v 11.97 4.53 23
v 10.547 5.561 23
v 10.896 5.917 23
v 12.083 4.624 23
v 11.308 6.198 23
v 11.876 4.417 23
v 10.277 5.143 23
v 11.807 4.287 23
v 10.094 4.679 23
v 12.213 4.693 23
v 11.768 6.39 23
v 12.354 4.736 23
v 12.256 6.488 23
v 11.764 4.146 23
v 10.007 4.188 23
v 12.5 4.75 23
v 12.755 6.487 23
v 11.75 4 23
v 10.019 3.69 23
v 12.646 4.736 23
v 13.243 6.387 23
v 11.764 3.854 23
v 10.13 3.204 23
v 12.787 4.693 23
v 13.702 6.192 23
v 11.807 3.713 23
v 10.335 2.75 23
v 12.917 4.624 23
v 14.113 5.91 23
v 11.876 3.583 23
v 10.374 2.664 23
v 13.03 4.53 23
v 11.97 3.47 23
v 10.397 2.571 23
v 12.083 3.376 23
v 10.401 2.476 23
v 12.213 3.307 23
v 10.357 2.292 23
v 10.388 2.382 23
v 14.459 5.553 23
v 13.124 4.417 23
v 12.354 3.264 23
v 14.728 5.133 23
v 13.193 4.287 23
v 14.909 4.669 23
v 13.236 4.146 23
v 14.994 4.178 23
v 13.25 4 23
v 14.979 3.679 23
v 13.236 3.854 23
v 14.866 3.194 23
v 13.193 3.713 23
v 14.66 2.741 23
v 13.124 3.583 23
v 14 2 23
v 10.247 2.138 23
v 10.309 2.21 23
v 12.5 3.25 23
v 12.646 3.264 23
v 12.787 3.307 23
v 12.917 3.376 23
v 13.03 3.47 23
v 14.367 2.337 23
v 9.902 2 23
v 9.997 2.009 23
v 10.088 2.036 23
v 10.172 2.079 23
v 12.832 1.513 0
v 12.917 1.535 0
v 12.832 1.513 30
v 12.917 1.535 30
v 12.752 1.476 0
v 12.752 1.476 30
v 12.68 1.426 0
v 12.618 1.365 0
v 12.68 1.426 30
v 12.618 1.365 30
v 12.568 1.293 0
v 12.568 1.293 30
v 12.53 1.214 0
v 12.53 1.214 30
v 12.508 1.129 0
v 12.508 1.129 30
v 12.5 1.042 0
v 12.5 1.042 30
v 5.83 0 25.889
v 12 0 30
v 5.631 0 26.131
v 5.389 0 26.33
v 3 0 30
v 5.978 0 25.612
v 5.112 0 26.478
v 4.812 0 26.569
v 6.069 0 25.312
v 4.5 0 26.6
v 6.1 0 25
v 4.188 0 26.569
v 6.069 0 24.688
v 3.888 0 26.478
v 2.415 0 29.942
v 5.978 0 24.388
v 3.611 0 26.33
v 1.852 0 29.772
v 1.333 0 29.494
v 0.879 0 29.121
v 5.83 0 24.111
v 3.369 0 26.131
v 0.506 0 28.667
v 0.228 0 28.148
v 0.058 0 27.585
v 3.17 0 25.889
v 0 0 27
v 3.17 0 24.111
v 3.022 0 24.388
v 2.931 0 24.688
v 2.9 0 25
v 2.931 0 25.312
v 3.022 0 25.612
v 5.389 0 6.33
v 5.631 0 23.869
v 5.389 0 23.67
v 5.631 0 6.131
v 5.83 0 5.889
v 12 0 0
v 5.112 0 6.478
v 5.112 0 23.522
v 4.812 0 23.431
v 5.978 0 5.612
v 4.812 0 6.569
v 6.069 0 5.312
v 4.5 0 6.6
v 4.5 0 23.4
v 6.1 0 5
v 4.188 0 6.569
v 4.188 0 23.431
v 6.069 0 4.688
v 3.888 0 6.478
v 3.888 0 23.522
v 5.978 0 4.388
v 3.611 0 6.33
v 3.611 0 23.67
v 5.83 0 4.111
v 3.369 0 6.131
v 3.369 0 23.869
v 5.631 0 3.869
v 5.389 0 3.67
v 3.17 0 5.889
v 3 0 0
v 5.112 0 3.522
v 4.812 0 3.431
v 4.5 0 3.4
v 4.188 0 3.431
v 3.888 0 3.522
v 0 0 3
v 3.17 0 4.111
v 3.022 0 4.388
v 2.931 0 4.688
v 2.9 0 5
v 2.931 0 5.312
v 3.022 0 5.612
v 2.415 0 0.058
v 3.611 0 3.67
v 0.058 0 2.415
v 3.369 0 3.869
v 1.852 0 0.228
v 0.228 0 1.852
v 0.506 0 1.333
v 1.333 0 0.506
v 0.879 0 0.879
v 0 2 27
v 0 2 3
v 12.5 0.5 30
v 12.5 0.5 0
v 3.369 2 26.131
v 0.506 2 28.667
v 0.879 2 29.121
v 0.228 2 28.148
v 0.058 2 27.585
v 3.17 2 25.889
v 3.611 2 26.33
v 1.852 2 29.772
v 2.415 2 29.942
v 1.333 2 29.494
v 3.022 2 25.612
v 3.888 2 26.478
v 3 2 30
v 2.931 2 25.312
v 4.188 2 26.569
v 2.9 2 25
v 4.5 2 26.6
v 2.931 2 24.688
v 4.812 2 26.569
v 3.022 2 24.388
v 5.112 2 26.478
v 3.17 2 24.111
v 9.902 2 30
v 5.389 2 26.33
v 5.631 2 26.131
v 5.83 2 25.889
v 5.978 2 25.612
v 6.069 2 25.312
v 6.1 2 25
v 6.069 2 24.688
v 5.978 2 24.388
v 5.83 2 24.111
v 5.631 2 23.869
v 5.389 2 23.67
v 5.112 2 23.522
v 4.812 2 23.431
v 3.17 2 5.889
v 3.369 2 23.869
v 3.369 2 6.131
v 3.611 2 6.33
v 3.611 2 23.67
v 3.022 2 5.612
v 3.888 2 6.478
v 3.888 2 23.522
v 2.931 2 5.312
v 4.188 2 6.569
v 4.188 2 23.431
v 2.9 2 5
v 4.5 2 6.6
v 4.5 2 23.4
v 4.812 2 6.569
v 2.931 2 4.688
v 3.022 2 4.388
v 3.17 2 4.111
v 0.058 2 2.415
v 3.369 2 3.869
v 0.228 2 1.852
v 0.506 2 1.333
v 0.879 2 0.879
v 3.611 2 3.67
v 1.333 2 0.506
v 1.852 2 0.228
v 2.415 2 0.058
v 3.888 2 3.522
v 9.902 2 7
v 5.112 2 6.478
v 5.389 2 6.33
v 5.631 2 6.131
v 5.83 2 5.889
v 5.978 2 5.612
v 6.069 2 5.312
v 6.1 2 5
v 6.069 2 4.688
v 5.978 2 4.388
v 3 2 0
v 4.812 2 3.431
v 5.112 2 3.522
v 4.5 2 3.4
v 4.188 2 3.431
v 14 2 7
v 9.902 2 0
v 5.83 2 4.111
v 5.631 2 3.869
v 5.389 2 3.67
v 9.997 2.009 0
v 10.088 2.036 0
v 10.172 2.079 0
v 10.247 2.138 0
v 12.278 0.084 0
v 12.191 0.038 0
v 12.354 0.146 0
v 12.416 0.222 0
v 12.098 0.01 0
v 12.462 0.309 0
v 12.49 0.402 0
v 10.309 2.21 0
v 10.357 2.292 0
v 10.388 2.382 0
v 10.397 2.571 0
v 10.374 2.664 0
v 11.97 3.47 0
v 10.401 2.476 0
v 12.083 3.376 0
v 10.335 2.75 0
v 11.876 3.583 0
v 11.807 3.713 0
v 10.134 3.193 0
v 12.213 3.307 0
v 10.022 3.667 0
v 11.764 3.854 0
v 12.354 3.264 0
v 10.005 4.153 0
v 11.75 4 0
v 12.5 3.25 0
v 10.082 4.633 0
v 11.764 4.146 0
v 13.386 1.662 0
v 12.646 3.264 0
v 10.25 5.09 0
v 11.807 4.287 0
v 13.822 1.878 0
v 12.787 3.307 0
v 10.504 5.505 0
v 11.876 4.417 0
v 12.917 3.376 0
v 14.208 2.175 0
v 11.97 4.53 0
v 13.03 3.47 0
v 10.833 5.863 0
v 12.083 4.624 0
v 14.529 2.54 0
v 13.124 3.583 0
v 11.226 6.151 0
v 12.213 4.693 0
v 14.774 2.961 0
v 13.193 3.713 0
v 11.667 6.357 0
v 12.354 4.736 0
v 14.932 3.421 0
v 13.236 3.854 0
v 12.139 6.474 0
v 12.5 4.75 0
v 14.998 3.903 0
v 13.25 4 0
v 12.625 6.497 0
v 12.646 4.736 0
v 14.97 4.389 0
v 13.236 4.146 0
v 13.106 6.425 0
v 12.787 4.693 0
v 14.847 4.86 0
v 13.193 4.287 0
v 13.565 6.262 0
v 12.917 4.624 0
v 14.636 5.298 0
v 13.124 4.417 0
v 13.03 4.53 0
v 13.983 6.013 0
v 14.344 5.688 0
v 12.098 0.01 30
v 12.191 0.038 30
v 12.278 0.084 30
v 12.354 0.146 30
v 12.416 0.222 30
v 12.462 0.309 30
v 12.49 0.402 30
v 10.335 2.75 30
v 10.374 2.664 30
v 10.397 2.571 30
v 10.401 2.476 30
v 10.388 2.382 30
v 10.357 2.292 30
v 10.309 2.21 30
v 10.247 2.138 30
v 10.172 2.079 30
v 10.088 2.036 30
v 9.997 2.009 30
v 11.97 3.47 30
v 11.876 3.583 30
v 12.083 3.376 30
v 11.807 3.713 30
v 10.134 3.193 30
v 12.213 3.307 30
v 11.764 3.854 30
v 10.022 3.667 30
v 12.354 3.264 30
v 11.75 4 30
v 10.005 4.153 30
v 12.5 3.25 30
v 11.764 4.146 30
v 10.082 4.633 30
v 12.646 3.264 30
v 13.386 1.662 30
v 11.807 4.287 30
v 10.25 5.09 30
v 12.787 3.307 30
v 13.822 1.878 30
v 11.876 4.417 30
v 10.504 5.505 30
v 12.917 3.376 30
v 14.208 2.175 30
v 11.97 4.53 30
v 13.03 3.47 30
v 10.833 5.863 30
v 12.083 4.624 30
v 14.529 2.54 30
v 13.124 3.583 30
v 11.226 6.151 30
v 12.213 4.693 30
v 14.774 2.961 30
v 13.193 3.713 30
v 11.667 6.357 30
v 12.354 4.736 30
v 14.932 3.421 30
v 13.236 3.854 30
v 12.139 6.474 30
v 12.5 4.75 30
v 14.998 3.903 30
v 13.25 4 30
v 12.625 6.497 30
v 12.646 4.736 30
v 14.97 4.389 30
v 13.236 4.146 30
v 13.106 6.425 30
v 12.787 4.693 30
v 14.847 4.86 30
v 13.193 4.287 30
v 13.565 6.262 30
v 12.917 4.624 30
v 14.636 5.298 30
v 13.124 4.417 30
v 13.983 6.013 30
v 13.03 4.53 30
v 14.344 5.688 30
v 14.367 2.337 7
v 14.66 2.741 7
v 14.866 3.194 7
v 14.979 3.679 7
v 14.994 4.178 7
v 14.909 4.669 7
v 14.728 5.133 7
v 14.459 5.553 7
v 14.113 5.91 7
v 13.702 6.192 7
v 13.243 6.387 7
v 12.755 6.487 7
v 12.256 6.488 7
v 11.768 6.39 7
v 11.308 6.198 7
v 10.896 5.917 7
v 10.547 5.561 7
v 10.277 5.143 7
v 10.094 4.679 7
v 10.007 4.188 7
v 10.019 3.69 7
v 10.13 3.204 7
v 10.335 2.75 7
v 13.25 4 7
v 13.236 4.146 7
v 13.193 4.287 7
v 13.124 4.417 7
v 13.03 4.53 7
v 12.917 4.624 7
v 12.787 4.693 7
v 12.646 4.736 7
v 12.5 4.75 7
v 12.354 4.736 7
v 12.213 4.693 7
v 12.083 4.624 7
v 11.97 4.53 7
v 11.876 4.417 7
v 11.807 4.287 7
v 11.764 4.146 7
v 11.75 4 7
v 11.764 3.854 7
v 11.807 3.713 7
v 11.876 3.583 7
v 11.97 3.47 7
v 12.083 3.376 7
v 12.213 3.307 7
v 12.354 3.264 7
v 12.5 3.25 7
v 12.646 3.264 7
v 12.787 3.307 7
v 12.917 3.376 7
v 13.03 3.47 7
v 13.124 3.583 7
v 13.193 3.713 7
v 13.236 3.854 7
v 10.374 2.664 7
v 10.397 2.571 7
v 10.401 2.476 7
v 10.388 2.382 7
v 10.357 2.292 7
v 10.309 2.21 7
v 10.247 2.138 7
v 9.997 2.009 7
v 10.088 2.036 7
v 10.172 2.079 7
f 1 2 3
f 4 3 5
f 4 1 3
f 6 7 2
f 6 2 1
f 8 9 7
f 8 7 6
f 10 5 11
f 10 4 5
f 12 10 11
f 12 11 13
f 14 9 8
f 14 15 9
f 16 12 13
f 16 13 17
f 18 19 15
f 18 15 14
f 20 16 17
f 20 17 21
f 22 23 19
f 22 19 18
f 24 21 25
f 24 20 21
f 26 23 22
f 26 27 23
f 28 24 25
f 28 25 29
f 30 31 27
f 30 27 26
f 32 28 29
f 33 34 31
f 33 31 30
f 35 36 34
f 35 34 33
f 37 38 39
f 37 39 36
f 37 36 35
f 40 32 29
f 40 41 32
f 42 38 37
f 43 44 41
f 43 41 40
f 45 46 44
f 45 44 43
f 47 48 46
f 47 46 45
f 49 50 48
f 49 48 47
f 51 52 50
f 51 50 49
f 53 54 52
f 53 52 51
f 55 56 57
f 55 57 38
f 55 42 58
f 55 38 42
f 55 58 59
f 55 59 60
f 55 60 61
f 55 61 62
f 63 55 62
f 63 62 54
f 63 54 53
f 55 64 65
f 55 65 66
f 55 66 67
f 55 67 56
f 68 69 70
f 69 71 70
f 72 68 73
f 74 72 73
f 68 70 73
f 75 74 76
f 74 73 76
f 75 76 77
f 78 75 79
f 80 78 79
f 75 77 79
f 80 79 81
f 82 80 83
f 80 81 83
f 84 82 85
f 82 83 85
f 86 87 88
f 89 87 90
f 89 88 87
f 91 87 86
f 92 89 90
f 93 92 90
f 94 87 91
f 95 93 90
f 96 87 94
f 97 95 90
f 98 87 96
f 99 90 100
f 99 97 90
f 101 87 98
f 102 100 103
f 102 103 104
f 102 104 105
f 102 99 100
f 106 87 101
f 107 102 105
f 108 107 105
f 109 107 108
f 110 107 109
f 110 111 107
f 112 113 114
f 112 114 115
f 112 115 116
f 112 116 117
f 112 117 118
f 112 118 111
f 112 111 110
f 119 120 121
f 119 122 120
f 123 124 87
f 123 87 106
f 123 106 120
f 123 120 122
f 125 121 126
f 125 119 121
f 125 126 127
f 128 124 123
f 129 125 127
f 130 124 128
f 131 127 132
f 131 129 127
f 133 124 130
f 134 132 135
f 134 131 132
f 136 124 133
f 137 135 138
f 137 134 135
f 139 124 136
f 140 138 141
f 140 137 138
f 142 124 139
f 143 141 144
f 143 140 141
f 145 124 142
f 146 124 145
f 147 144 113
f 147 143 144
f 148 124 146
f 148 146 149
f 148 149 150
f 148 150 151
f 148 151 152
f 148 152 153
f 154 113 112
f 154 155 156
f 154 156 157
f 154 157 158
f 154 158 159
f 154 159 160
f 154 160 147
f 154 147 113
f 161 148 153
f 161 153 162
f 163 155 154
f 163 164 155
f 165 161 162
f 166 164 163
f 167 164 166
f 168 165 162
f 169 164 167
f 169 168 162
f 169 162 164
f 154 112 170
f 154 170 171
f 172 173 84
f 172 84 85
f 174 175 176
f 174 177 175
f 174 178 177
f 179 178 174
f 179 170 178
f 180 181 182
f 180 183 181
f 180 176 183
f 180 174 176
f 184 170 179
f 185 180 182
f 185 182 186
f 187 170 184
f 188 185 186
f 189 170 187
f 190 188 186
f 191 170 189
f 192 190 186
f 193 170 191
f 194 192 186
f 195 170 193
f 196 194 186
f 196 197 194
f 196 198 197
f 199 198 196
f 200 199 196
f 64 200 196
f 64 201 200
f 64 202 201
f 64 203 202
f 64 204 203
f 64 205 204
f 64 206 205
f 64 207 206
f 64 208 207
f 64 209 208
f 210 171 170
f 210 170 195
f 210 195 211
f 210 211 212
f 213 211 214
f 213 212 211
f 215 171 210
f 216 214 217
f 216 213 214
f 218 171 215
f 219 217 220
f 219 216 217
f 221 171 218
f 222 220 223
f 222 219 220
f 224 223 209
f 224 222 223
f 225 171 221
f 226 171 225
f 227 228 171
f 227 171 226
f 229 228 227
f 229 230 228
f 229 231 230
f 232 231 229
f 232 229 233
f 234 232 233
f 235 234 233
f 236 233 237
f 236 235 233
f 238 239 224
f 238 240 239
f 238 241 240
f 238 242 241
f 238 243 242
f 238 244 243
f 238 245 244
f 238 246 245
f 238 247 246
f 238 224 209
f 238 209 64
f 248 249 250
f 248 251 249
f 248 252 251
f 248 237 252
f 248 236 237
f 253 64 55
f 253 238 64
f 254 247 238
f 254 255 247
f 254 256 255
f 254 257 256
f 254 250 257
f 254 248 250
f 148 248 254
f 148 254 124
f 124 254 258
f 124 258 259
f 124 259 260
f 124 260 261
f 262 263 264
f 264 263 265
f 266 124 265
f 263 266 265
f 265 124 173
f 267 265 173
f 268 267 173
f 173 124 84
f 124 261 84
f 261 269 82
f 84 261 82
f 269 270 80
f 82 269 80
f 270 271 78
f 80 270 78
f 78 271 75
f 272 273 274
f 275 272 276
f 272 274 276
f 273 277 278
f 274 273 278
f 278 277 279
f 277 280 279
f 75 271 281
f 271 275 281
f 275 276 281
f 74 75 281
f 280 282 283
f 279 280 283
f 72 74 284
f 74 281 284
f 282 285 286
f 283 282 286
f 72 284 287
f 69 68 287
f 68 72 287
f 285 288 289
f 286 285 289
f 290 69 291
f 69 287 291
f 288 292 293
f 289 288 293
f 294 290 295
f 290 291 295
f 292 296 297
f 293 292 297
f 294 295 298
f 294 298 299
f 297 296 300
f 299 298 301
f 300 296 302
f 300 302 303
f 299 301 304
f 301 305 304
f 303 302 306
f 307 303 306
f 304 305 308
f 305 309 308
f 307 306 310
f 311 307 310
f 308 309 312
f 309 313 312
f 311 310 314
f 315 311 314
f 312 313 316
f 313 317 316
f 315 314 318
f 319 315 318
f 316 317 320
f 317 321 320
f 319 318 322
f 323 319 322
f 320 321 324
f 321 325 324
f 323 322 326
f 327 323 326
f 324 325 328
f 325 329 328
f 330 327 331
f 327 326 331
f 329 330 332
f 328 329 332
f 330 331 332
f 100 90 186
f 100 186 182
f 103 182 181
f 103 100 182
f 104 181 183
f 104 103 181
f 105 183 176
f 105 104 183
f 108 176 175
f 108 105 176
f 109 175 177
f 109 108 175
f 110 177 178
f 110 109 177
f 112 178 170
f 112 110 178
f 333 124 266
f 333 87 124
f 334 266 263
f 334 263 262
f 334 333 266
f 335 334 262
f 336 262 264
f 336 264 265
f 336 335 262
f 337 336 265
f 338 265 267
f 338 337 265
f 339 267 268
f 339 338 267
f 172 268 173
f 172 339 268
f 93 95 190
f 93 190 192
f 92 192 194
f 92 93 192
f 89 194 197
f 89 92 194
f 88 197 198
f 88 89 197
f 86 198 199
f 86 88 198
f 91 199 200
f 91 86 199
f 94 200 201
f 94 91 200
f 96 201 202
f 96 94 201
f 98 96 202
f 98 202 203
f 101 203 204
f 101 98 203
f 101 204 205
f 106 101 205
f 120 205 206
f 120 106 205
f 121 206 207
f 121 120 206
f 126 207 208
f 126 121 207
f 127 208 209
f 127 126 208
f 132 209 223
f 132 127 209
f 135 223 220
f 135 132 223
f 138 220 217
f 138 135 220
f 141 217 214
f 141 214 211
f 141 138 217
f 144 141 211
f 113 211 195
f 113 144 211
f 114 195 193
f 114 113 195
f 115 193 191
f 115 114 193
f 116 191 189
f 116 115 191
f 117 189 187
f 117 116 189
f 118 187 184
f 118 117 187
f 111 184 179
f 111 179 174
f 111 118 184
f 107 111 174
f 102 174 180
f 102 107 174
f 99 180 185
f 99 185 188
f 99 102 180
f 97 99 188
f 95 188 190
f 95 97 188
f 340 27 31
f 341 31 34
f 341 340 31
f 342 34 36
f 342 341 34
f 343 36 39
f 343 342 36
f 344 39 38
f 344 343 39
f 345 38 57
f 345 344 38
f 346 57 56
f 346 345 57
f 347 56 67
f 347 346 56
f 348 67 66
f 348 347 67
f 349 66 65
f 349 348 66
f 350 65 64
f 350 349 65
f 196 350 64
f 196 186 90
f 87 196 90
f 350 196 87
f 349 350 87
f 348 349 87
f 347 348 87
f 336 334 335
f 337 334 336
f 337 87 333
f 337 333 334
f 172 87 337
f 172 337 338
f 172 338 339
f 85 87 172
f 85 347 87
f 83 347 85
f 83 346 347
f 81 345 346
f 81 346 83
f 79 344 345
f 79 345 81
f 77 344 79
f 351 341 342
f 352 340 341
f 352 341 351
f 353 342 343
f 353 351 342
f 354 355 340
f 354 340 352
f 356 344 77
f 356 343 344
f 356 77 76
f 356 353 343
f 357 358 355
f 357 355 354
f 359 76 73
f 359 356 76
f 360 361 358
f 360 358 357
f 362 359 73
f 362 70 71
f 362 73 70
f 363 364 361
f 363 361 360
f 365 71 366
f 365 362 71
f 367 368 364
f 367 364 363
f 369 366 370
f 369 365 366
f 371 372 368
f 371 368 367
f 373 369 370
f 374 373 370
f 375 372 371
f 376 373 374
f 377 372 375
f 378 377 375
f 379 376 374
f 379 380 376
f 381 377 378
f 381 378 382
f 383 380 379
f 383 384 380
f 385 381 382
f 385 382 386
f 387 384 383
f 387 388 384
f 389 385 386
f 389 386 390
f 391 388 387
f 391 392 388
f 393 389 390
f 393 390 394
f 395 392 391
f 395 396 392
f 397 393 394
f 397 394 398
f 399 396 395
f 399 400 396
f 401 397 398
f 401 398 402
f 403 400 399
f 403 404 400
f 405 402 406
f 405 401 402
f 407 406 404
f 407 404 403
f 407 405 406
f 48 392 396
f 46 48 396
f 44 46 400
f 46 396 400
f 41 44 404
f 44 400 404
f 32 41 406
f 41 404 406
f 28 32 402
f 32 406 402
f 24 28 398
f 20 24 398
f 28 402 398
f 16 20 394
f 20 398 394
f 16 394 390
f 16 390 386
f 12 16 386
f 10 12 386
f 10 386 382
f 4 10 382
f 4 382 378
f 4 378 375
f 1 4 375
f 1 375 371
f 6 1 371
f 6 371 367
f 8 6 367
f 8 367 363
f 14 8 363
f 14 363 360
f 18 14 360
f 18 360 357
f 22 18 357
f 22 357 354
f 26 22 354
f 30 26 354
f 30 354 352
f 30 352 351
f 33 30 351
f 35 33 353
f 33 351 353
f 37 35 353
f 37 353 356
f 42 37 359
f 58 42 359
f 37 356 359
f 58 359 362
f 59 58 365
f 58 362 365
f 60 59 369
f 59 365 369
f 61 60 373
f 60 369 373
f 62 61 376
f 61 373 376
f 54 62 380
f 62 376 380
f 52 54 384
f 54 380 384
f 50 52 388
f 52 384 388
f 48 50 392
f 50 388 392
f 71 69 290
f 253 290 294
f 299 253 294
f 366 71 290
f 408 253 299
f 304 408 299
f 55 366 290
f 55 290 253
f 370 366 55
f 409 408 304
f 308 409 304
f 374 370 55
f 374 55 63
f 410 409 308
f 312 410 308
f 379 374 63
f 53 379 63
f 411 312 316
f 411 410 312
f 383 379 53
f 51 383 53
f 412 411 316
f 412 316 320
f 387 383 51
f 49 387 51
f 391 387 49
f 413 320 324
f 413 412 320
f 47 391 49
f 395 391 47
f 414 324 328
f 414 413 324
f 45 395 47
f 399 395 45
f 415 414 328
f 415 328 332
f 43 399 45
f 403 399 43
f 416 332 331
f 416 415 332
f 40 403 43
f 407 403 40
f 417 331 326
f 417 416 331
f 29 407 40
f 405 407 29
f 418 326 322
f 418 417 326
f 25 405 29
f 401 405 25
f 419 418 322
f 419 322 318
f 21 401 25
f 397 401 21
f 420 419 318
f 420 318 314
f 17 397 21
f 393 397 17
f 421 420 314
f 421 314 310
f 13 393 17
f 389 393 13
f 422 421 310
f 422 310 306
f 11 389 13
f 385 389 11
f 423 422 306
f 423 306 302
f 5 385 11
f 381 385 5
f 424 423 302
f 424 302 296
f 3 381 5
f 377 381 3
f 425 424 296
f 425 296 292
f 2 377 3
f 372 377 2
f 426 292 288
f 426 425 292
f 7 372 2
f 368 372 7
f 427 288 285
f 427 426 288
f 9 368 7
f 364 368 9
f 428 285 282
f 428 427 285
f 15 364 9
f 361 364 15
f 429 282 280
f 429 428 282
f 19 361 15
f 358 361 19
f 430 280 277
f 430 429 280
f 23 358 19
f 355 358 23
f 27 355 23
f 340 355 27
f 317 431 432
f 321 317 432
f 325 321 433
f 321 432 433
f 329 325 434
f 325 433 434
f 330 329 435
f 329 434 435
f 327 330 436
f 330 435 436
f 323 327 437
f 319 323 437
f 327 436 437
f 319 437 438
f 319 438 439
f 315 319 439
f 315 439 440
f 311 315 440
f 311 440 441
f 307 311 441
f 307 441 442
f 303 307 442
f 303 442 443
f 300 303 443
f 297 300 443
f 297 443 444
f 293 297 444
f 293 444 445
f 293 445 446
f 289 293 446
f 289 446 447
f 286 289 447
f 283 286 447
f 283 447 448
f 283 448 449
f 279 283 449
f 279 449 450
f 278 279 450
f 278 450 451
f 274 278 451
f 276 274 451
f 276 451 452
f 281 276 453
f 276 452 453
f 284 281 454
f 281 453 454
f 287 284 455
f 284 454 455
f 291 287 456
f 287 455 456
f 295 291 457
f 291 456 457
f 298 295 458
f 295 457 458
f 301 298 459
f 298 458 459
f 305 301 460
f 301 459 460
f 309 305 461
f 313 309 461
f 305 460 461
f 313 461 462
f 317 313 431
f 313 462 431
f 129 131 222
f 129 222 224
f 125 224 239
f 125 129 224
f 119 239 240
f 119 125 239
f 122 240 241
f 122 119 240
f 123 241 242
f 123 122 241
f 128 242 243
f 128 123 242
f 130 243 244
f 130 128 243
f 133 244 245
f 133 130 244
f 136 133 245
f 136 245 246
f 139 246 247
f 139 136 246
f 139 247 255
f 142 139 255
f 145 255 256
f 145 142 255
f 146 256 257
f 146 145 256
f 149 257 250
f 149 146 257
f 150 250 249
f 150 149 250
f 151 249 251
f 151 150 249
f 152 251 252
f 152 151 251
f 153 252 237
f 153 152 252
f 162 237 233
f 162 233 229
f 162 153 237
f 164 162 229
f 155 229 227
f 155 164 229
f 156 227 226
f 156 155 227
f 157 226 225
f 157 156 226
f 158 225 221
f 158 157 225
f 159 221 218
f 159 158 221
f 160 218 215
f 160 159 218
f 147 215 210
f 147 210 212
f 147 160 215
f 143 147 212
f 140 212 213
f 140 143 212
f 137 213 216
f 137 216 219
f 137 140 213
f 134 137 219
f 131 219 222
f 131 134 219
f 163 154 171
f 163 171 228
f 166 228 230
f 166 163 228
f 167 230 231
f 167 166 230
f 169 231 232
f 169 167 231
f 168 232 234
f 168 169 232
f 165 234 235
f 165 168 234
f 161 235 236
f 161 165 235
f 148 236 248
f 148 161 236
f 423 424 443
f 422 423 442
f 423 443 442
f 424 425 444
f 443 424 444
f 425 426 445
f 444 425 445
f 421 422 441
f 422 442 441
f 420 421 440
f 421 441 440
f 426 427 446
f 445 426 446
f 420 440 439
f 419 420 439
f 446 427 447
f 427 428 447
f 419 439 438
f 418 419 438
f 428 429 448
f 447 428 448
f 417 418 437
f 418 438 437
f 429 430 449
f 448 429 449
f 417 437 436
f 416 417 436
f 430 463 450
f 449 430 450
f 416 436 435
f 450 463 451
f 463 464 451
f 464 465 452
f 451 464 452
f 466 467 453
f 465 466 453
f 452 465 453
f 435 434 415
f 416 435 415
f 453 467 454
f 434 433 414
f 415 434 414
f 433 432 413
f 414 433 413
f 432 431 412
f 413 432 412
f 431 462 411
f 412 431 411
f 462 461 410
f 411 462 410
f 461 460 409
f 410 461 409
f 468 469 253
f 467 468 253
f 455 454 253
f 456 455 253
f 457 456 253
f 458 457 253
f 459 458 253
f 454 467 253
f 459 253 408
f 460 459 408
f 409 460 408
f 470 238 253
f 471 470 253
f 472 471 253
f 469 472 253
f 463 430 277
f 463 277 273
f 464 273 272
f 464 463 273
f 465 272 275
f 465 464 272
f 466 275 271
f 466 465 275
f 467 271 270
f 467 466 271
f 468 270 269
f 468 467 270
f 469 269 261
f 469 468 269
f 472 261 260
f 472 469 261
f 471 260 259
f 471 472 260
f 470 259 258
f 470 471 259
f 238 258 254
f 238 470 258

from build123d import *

# Parameters (mm, degrees)
SKETCH_1_R          = 1.6
EXTRUDE_1_DEPTH     = 2
SKETCH_2_R          = 2.5
EXTRUDE_2_DEPTH     = 30
FILLET_1_R          = 0.5
SKETCH_3_R          = 0.75
CUT_EXTRUDE_1_DEPTH = 35.165040612
SKETCH_4_W          = 5.098076211
SKETCH_4_H          = 16
CUT_EXTRUDE_2_DEPTH = 34.841542518


with BuildPart() as part:
    # 草图1 → 凸台-拉伸1 (new body)
    with BuildSketch(Plane(origin=(0, 0, 0), x_dir=(1, 0, 0), z_dir=(0, 1, 0))):
        with BuildLine():
            Line((3, 0), (12.5, 0))
            Line((12.5, 0), (12.5, -30))
            Line((12.5, -30), (3, -30))
            ThreePointArc((3, -30), (0.878679656, -29.121320344), (0, -27))
            Line((0, -27), (0, -3))
            ThreePointArc((0, -3), (0.878679656, -0.878679656), (3, 0))
        make_face()
        with Locations(Location((4.5, -5, 0), (0, 0, 270))):
            Circle(SKETCH_1_R, mode=Mode.SUBTRACT)
        with Locations(Location((4.5, -25, 0), (0, 0, 270))):
            Circle(SKETCH_1_R, mode=Mode.SUBTRACT)
    extrude(amount=EXTRUDE_1_DEPTH)

    # 草图2 → 凸台-拉伸2 (add)
    with BuildSketch(Plane.XY.offset(30)):
        with Locations((12.5, 4)):
            Circle(SKETCH_2_R)
    extrude(amount=-EXTRUDE_2_DEPTH)

    # 圆角1
    fillet_1_edges = [part.edges().sort_by_distance(p)[0] for p in [
        (12.5, 1.5, 15),
        (11, 2, 15),
        (12.5, 0, 15),
    ]]
    fillet(fillet_1_edges, radius=FILLET_1_R)

    # 草图3 → 切除-拉伸1 (cut, through all)
    with BuildSketch(Plane.XY.offset(30)):
        with Locations((12.5, 4)):
            Circle(SKETCH_3_R)
    extrude(amount=-CUT_EXTRUDE_1_DEPTH, mode=Mode.SUBTRACT)

    # 草图4 → 切除-拉伸2 (cut, through all)
    with BuildSketch(Plane(origin=(0, 2, 0), x_dir=(1, 0, 0), z_dir=(0, 1, 0))):
        with Locations((12.450961895, -15)):
            Rectangle(SKETCH_4_W, SKETCH_4_H)
    extrude(amount=CUT_EXTRUDE_2_DEPTH, mode=Mode.SUBTRACT)


solid = part.part
